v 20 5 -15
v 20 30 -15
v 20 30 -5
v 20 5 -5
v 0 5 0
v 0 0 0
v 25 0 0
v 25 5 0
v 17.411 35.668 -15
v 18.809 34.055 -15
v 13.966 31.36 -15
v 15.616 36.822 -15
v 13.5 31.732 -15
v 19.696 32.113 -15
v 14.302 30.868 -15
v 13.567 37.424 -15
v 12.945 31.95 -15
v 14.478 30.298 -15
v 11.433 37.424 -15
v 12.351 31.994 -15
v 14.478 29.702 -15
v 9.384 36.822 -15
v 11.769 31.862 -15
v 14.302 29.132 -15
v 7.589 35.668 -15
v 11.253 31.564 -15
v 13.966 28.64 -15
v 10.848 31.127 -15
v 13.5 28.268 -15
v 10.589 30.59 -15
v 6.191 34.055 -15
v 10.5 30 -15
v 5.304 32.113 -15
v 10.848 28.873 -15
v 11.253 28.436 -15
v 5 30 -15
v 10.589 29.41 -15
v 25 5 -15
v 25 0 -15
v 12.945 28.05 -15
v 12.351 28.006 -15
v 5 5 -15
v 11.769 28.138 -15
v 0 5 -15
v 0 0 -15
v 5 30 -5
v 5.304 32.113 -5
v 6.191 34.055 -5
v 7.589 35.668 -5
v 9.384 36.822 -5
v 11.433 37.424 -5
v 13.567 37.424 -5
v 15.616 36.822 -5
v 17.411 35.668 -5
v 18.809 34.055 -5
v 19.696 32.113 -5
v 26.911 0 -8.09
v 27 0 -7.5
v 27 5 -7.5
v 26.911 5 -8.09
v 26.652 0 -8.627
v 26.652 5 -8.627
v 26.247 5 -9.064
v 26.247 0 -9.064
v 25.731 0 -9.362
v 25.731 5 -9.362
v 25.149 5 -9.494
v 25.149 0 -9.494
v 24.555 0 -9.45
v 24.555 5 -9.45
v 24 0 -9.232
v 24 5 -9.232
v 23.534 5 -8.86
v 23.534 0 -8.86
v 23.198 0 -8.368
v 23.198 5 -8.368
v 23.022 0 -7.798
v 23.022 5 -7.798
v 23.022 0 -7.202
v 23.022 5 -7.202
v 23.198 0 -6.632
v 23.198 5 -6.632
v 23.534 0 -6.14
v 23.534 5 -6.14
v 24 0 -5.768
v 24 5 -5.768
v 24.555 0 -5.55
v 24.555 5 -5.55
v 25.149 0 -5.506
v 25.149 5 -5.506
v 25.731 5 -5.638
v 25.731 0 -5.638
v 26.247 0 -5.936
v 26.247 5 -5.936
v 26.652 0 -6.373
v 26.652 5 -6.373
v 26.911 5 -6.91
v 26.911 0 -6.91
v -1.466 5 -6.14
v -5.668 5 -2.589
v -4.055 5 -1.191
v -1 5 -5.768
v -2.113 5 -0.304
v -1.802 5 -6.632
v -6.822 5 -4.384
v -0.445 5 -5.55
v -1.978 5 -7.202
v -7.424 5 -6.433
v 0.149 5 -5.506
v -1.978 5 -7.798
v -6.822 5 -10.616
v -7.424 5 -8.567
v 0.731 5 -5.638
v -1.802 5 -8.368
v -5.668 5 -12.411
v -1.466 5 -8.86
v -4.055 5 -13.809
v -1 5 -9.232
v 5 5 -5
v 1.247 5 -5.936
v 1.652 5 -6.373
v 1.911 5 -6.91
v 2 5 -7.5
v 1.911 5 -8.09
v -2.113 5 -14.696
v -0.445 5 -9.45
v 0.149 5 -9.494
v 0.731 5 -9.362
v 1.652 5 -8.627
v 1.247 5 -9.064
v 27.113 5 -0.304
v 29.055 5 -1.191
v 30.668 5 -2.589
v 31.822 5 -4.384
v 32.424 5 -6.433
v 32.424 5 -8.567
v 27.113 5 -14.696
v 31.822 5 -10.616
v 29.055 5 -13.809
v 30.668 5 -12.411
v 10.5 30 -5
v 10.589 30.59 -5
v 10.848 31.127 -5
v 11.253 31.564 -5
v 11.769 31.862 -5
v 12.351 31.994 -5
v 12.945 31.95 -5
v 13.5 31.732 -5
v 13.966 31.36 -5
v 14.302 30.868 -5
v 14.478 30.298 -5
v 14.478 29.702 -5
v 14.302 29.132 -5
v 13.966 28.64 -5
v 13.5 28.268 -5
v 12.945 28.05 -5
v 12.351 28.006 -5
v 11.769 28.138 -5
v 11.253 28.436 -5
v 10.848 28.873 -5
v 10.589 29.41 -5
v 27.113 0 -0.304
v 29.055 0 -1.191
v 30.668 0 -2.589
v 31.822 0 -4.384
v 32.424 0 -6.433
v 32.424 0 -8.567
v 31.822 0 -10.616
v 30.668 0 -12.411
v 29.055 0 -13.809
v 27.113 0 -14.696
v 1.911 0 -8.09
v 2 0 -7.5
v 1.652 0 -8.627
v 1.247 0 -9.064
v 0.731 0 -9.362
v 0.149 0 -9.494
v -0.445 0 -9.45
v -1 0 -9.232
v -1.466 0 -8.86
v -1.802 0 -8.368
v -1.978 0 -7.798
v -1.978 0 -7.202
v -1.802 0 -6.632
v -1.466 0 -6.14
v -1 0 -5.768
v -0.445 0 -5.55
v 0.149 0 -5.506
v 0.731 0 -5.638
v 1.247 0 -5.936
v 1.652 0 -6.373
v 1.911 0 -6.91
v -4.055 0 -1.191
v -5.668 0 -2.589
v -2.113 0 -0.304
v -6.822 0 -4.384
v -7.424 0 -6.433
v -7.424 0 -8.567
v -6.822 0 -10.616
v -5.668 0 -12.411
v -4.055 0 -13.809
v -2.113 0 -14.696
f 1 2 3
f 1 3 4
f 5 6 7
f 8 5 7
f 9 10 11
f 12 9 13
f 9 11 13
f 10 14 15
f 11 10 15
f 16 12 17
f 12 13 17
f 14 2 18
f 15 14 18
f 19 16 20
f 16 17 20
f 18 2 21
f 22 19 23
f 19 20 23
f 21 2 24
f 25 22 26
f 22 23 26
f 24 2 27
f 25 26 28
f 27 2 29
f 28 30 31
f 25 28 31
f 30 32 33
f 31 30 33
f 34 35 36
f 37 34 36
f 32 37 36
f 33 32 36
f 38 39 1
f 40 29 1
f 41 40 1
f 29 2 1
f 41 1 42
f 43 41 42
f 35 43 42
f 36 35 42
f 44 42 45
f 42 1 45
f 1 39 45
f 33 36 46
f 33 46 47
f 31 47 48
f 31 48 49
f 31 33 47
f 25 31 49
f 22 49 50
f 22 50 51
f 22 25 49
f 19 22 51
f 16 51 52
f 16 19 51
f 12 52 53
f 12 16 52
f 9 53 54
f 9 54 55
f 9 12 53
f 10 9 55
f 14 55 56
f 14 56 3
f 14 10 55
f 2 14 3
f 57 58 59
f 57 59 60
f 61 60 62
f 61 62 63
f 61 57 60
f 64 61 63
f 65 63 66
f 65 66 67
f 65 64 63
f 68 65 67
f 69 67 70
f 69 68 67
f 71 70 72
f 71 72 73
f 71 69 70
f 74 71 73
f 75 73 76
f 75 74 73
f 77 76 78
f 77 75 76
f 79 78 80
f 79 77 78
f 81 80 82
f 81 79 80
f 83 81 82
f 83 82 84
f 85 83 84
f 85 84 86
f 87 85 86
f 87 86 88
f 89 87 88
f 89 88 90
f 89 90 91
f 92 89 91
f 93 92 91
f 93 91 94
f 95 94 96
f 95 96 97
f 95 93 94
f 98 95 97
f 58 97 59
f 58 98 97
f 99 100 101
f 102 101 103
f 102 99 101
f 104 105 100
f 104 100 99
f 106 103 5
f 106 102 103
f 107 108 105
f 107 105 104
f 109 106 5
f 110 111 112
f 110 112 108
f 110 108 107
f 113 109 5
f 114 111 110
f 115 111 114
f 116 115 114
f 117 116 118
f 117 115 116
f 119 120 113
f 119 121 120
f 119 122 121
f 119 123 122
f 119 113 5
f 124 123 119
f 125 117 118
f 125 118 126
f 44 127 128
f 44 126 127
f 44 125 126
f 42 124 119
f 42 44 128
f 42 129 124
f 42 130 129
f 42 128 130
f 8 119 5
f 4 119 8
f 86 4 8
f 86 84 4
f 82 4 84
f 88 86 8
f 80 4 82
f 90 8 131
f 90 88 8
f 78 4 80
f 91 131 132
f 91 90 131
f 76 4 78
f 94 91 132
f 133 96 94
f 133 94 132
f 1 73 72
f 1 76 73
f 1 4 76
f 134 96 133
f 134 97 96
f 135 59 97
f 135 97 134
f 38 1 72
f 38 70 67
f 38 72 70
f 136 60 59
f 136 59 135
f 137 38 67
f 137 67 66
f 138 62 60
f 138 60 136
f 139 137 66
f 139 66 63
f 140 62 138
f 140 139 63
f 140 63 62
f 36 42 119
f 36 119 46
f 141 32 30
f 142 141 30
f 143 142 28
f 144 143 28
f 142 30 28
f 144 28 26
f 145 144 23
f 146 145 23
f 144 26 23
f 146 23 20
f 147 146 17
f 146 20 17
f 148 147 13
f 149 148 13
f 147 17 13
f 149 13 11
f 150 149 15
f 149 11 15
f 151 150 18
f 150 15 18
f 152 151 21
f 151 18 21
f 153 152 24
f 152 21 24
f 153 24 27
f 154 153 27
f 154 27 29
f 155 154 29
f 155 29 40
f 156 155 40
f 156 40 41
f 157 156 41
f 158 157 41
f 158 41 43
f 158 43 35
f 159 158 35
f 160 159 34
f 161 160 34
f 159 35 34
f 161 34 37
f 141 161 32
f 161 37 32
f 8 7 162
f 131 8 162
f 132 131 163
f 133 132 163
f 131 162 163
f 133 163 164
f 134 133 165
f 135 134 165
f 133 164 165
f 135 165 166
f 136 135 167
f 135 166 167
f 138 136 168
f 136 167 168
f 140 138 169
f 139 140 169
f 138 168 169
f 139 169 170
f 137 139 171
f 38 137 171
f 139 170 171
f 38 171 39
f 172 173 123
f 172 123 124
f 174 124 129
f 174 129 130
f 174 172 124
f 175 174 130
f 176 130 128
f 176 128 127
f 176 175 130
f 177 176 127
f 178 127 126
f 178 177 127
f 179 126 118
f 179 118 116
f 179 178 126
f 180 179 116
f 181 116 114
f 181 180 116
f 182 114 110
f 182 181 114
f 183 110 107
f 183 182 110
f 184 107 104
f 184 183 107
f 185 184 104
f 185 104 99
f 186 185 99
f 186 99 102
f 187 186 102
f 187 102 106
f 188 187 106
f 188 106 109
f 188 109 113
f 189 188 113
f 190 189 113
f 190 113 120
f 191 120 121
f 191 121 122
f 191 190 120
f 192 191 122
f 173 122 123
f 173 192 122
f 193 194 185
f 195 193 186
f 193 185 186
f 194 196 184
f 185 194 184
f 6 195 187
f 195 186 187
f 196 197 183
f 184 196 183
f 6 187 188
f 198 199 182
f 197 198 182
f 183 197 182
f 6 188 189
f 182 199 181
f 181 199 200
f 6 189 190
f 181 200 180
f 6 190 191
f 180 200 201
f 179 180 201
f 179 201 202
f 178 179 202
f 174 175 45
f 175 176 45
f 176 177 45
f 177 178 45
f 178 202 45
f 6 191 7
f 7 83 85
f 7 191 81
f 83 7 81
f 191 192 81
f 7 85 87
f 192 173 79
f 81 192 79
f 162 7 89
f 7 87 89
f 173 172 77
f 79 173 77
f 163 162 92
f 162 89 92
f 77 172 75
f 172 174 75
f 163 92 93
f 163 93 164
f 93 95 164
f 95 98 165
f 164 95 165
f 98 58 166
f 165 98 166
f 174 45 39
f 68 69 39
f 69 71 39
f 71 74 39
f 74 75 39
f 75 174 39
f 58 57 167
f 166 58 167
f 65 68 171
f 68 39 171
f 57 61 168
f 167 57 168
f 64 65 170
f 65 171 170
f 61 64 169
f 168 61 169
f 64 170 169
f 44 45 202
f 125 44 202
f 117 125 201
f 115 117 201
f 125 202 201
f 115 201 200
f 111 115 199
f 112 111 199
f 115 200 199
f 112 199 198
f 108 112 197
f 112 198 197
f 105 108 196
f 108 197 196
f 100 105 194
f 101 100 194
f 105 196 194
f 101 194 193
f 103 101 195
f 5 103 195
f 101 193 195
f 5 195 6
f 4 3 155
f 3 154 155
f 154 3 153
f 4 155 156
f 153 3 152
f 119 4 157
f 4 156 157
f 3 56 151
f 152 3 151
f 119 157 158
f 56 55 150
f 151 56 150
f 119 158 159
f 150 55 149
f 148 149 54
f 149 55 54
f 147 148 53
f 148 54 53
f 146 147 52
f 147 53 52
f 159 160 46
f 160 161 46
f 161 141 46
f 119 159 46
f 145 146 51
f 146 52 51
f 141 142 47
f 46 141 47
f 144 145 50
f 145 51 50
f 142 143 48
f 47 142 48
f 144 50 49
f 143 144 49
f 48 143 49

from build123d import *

# Parameters (mm, degrees)
SKETCH1_R           = 2
BOSS_EXTRUDE1_DEPTH = 5
SKETCH3_R           = 2
BOSS_EXTRUDE2_DEPTH = 10


with BuildPart() as part:
    # Sketch1 → Boss-Extrude1 (new body)
    with BuildSketch(Plane(origin=(0, 0, 0), x_dir=(1, 0, 0), z_dir=(0, 1, 0))):
        with BuildLine():
            Line((0, 0), (25, 0))
            ThreePointArc((25, 0), (32.5, 7.5), (25, 15))
            Line((25, 15), (0, 15))
            ThreePointArc((0, 15), (-7.5, 7.5), (0, 0))
        make_face()
        with Locations((0, 7.5)):
            Circle(SKETCH1_R, mode=Mode.SUBTRACT)
        with Locations((25, 7.5)):
            Circle(SKETCH1_R, mode=Mode.SUBTRACT)
    extrude(amount=BOSS_EXTRUDE1_DEPTH)

    # Sketch3 → Boss-Extrude2 (add)
    with BuildSketch(Plane(origin=(0, 0, -15), x_dir=(-1, 0, 0), z_dir=(0, 0, -1))):
        with BuildLine():
            Line((-20, 5), (-5, 5))
            Line((-5, 5), (-5, 30))
            ThreePointArc((-5, 30), (-12.5, 37.5), (-20, 30))
            Line((-20, 30), (-20, 5))
        make_face()
        with Locations((-12.5, 30)):
            Circle(SKETCH3_R, mode=Mode.SUBTRACT)
    extrude(amount=-BOSS_EXTRUDE2_DEPTH)


solid = part.part
